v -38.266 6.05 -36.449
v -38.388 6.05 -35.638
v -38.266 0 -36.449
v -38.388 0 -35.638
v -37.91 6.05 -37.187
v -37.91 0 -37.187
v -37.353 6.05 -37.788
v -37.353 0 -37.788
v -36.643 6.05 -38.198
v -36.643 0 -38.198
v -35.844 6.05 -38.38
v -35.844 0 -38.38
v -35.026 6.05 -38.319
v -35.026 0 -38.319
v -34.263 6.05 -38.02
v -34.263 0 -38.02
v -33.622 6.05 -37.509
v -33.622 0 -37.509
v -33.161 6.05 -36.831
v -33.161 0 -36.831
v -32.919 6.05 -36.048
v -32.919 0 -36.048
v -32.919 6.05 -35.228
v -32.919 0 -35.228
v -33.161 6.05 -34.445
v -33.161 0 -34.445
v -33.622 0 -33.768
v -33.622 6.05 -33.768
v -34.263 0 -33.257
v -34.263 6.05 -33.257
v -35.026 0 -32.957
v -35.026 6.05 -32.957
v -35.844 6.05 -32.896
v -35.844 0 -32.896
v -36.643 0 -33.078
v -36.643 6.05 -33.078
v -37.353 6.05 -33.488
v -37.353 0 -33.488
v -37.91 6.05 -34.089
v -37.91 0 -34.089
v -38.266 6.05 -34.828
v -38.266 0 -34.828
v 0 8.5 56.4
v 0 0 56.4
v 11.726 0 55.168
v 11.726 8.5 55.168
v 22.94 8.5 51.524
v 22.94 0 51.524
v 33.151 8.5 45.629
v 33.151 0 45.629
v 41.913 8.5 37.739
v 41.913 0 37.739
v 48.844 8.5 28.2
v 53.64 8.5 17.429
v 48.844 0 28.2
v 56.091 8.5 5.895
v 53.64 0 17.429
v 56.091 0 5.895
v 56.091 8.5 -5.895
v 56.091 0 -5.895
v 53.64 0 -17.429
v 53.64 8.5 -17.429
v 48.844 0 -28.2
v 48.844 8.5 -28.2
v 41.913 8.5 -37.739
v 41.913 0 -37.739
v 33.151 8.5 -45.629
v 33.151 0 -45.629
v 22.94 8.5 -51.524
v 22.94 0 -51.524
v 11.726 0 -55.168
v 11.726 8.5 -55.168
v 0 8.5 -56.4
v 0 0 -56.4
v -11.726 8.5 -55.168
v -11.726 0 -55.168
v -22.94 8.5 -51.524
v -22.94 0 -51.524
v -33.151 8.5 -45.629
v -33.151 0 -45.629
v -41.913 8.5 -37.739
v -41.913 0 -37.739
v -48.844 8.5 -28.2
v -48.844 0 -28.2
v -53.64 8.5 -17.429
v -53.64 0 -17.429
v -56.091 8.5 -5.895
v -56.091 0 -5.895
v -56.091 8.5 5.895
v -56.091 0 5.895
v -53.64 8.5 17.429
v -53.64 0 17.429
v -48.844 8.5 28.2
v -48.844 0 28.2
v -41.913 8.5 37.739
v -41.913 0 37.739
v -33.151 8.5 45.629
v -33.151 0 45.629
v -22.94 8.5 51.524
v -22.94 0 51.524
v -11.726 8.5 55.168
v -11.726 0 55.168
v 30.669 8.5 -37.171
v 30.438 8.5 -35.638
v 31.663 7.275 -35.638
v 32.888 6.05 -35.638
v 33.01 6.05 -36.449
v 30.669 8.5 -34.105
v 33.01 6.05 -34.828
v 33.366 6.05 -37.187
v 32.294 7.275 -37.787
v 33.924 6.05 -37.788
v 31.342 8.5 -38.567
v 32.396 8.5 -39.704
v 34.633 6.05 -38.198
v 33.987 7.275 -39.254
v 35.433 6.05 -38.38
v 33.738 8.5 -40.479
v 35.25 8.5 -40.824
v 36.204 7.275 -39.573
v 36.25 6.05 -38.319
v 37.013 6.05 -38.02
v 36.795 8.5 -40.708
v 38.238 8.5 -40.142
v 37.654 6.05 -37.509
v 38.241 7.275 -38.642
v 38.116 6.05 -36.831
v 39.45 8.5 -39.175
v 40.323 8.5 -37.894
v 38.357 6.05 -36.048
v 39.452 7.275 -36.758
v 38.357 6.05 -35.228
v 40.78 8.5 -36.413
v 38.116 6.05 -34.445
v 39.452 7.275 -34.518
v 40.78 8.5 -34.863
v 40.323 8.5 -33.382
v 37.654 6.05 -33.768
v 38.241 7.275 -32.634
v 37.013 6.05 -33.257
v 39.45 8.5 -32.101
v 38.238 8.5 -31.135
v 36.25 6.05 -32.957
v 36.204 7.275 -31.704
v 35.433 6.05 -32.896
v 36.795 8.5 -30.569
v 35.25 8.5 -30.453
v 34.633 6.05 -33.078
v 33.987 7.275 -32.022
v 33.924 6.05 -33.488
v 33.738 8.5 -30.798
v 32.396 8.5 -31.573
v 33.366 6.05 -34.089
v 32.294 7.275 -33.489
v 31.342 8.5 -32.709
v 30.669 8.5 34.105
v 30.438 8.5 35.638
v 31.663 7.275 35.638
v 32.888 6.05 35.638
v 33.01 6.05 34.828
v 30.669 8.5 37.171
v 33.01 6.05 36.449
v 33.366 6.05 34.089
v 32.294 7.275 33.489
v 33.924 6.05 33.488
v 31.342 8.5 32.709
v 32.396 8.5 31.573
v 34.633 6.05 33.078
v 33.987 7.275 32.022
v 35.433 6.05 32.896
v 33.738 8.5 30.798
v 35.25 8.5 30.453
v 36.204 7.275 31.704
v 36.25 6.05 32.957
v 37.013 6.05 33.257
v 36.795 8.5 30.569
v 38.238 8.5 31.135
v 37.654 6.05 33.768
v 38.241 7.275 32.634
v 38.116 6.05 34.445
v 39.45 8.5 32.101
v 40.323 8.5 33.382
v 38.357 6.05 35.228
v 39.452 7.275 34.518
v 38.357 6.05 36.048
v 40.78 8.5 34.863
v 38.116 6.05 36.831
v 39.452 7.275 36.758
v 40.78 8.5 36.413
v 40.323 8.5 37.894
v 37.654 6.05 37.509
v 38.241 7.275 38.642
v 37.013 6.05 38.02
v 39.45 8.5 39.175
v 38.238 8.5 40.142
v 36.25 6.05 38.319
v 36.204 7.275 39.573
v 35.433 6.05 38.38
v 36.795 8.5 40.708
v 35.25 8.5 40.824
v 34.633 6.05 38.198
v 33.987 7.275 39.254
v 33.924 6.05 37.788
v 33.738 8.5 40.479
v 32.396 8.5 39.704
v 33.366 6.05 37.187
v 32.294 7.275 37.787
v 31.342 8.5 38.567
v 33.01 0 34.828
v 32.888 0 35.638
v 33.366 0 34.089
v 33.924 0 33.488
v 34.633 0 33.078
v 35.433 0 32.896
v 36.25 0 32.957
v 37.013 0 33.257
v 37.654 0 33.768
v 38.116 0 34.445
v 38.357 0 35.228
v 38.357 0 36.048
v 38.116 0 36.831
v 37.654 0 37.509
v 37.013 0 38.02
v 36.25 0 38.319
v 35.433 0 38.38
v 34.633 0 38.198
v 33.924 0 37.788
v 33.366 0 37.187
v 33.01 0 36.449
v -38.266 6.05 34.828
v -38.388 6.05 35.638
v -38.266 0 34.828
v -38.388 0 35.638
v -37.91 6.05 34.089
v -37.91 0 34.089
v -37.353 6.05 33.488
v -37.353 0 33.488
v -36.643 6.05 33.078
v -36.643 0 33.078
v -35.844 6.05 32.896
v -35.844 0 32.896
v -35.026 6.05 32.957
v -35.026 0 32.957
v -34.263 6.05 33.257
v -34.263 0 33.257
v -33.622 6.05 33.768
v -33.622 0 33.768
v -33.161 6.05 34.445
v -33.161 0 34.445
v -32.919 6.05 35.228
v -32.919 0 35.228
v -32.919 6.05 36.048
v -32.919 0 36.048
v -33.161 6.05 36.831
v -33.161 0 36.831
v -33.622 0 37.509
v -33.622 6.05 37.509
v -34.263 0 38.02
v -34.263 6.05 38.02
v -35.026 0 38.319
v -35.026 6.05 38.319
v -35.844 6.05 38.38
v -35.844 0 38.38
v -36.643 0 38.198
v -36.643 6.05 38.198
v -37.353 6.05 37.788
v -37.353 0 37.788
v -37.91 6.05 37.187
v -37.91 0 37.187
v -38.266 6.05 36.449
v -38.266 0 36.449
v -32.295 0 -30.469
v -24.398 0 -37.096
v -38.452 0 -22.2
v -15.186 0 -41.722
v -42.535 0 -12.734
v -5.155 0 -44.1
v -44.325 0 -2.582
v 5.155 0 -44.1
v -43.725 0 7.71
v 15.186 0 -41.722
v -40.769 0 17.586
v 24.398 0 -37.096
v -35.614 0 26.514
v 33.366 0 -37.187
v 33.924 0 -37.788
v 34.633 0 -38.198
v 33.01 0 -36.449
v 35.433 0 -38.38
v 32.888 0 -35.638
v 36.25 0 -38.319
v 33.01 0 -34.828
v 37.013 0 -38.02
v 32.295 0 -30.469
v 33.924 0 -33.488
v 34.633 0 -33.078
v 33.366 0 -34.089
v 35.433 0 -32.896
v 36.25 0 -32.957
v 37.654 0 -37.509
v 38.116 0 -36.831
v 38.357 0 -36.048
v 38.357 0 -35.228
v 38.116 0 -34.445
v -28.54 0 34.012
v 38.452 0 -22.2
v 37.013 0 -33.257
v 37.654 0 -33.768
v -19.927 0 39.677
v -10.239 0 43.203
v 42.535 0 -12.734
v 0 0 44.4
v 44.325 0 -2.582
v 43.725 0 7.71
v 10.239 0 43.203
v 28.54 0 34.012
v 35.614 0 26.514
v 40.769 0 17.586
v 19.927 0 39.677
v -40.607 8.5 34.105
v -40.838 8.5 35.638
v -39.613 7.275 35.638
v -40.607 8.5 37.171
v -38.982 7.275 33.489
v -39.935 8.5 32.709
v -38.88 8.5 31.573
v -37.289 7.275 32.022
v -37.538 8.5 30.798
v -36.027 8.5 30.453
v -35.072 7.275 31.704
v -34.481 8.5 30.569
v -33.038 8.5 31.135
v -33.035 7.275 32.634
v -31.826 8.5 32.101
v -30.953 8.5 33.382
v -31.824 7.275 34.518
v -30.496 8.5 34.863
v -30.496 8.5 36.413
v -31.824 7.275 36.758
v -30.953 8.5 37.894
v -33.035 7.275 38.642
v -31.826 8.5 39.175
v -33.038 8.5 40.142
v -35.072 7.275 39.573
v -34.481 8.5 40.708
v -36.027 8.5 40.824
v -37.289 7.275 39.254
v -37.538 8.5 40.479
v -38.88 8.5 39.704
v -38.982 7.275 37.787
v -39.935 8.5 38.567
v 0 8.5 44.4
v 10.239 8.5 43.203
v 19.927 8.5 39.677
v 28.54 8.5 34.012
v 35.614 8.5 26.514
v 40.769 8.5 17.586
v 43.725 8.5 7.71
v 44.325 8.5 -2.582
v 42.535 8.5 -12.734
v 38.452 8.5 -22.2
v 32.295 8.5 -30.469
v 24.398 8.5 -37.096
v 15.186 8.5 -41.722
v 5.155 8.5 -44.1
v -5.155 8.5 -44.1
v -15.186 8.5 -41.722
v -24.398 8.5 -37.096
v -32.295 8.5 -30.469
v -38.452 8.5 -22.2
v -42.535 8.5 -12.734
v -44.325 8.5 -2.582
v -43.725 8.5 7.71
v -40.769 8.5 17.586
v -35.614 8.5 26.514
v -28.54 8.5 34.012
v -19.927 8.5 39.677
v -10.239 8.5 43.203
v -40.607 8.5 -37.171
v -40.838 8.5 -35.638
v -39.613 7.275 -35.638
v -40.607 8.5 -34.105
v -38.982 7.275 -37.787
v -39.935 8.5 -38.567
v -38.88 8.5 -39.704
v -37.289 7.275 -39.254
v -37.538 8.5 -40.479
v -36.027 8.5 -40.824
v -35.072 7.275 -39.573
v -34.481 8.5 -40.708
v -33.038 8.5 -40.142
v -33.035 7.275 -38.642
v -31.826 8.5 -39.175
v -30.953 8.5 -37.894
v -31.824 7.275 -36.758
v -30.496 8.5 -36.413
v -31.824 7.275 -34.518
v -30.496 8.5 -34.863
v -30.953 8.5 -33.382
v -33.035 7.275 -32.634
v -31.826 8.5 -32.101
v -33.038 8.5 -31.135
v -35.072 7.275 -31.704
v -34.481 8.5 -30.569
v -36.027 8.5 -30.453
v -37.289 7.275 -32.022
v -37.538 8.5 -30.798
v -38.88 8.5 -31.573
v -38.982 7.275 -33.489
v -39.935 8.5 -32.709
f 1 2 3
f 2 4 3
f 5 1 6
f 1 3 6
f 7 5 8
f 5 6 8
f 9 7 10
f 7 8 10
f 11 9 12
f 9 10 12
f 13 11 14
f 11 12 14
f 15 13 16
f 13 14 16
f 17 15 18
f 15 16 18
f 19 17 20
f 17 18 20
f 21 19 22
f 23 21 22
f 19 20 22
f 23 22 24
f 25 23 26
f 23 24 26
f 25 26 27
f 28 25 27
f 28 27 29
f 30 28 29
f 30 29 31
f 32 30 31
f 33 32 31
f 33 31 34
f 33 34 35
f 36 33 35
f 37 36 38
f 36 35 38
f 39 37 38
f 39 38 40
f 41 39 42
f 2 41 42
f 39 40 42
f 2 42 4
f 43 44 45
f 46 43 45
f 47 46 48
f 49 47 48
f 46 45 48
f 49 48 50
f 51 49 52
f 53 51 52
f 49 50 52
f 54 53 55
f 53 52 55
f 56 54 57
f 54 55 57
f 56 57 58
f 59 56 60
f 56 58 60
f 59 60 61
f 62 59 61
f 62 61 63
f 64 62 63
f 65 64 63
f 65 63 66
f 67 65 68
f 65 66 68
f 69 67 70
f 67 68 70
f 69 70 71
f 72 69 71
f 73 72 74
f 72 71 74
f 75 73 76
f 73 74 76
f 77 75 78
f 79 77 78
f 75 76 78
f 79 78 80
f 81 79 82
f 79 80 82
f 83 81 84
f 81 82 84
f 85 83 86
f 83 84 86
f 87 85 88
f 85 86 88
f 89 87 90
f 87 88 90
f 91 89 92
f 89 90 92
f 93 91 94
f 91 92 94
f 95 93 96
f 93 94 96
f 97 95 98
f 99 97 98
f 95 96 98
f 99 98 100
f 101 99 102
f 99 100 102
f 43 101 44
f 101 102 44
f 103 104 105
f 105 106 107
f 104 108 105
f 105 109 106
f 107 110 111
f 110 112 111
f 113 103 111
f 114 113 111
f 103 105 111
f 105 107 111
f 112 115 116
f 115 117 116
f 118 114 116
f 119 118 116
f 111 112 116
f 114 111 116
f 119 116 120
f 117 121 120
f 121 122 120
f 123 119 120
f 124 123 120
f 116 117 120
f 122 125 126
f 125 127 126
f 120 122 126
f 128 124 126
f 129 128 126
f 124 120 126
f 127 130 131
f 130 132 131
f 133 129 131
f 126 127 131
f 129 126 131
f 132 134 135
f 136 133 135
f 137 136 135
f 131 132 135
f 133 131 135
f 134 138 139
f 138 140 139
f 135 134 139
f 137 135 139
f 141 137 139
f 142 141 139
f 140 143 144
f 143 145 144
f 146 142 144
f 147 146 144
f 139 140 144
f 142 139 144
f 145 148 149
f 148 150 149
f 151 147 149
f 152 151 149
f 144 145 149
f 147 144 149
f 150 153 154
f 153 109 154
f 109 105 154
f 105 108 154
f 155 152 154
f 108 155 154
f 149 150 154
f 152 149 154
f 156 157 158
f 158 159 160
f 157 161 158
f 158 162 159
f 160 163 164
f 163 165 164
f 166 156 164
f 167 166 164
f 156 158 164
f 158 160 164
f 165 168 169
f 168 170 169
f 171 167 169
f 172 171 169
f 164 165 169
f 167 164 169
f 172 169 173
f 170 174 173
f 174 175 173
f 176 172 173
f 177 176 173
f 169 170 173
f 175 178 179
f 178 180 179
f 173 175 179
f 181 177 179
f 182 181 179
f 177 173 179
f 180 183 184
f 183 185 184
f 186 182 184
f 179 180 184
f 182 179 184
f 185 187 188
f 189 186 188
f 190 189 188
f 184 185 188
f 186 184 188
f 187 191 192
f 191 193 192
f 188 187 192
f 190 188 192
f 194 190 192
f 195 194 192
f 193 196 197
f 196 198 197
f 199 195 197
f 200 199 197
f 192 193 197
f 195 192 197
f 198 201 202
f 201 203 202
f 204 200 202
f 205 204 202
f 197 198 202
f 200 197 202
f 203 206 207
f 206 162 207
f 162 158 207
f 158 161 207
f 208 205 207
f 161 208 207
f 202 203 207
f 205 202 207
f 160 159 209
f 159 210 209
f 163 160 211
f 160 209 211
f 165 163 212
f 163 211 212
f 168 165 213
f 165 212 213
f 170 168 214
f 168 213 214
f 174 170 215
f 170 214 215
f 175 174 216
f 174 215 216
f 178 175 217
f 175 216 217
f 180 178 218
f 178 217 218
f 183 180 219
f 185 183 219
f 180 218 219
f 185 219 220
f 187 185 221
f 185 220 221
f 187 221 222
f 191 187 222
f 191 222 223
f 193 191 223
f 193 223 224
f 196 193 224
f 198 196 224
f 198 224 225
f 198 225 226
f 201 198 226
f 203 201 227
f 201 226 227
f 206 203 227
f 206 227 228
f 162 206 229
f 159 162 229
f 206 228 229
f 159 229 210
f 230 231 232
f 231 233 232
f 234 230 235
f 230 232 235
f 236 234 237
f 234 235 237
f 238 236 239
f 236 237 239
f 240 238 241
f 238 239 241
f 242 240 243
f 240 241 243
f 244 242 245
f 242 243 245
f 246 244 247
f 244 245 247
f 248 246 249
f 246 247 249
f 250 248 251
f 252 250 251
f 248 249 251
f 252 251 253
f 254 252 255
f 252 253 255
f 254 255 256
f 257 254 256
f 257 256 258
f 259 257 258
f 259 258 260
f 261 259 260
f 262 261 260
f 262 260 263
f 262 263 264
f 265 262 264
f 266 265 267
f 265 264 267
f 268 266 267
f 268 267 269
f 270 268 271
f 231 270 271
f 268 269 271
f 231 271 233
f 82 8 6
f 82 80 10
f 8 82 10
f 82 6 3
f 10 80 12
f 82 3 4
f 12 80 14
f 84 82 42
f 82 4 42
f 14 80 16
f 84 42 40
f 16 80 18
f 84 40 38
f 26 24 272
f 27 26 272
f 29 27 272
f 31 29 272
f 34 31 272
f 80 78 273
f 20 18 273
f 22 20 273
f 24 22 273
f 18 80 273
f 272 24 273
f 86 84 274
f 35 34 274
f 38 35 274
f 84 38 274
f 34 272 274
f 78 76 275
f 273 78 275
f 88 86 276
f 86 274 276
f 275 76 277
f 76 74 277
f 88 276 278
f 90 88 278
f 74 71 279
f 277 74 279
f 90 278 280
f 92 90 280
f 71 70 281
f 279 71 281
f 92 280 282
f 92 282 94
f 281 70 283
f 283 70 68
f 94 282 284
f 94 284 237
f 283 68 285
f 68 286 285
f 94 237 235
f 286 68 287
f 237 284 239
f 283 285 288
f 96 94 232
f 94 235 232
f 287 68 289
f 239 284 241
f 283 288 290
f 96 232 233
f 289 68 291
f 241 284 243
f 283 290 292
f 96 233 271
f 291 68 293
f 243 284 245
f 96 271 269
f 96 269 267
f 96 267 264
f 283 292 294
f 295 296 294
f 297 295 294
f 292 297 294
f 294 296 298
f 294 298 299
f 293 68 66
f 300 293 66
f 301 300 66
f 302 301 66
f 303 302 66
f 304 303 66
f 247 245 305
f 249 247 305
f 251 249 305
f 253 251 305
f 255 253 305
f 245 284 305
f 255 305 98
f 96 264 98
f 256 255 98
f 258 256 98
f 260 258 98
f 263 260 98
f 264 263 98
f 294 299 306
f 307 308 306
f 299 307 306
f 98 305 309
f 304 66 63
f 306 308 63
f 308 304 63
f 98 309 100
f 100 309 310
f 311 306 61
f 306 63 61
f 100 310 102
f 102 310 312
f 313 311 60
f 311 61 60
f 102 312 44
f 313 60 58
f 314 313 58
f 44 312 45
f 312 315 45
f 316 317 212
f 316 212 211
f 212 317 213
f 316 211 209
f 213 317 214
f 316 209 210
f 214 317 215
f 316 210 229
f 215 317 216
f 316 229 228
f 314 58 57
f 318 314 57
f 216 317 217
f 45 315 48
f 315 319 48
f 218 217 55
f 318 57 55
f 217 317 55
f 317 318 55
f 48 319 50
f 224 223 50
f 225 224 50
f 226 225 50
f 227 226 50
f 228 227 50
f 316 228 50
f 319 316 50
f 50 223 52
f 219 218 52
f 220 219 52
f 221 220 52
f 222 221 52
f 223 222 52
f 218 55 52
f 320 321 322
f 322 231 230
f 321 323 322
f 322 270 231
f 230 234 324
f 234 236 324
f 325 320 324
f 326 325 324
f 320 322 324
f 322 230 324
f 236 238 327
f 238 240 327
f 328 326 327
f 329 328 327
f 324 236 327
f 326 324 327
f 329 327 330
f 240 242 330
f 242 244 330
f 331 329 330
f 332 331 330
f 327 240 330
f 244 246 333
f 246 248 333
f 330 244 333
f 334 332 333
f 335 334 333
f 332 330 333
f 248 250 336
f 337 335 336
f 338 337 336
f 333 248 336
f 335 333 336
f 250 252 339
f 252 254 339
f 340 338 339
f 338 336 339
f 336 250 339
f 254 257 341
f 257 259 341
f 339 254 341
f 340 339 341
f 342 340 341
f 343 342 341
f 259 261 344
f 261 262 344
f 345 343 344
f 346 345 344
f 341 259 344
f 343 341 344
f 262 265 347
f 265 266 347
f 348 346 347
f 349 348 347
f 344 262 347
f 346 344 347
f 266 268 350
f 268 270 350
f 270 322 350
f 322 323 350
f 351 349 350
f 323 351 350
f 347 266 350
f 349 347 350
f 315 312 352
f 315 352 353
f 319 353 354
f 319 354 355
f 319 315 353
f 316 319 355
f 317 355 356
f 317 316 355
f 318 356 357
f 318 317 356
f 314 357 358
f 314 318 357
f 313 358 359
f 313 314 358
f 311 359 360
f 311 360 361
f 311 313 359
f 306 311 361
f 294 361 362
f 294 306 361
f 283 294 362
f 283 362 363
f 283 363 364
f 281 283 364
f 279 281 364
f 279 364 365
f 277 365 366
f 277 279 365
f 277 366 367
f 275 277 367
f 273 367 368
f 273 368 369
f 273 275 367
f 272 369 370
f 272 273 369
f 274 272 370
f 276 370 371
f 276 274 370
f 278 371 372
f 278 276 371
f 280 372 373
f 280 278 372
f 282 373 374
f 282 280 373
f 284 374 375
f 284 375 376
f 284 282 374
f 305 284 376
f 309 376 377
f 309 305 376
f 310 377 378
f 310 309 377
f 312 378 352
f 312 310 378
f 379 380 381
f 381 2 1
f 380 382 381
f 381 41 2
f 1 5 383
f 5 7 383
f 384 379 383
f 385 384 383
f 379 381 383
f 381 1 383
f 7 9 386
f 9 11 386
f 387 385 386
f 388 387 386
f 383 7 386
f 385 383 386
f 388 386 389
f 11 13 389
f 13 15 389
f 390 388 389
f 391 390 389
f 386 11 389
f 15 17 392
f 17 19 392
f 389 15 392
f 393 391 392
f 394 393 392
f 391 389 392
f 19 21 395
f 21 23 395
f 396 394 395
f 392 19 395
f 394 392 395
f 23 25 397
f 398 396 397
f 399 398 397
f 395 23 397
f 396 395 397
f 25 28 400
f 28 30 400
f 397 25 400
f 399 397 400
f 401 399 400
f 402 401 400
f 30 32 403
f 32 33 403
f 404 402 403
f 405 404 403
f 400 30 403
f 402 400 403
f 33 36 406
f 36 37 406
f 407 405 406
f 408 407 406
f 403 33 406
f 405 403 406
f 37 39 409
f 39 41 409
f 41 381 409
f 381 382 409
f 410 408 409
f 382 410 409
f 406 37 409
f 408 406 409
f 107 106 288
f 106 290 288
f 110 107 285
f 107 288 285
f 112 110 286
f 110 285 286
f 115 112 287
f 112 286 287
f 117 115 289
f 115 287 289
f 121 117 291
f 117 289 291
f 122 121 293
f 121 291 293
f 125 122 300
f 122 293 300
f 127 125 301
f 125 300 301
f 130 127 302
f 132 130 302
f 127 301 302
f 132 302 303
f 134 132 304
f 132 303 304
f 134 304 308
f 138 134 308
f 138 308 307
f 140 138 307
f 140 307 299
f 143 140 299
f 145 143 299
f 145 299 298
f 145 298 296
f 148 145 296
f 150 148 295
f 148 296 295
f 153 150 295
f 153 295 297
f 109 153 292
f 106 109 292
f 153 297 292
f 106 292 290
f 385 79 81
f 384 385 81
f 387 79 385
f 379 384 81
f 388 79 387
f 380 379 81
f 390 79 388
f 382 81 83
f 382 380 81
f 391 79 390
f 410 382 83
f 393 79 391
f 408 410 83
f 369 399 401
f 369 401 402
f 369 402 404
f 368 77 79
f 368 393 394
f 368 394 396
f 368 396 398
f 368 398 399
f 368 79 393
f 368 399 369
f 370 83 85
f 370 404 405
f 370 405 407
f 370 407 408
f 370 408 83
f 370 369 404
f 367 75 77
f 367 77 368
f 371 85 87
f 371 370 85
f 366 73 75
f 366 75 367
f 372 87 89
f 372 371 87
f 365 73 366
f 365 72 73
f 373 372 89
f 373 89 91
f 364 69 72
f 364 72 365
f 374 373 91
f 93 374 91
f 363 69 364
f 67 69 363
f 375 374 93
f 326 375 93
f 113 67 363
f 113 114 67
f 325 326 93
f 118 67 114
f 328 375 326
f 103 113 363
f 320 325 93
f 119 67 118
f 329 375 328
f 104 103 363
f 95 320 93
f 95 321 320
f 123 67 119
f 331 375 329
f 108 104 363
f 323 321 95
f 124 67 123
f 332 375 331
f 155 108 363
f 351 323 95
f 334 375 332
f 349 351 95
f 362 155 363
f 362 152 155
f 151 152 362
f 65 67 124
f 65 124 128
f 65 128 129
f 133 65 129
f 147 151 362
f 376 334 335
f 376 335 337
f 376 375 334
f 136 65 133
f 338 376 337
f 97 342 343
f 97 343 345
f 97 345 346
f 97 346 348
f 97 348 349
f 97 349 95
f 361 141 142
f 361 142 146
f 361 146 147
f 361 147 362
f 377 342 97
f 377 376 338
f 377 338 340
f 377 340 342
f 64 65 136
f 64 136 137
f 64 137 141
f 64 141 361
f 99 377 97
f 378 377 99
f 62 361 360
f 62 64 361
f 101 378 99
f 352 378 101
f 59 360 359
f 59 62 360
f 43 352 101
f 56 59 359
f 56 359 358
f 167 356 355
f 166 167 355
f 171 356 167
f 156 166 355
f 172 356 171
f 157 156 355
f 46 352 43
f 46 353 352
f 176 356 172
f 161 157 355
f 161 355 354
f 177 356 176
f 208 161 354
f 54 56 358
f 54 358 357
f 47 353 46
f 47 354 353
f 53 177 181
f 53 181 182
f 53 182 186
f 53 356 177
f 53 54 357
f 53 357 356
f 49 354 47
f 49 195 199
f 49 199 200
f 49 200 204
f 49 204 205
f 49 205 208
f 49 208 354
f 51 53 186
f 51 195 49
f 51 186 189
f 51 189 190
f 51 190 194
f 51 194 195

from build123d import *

# Parameters (mm, degrees)
SKETCH1_R                                       = 56.4
SKETCH1_R_2                                     = 44.4
BOSS_EXTRUDE1_DEPTH                             = 8.5
CSK_FOR_M5_FLAT_HEAD_MACHINE_SCREW1_D           = 5.5
CSK_FOR_M5_FLAT_HEAD_MACHINE_SCREW1_DEPTH       = 30
CSK_FOR_M5_FLAT_HEAD_MACHINE_SCREW1_CSINK_D     = 10.4
CSK_FOR_M5_FLAT_HEAD_MACHINE_SCREW1_CSINK_ANGLE = 90
CSK_FOR_M5_FLAT_HEAD_MACHINE_SCREW1_TIP         = 1.652366702


with BuildPart() as part:
    # Sketch1 → Boss-Extrude1 (new body)
    with BuildSketch(Plane(origin=(0, 0, 0), x_dir=(1, 0, 0), z_dir=(0, 1, 0))):
        with Locations(Location((0, 0, 0), (0, 0, 270))):
            Circle(SKETCH1_R)
        with Locations(Location((0, 0, 0), (0, 0, 270))):
            Circle(SKETCH1_R_2, mode=Mode.SUBTRACT)
    extrude(amount=BOSS_EXTRUDE1_DEPTH)

    # CSK for M5 Flat Head Machine Screw1
    with Locations(Plane(origin=(0, 8.5, 0), x_dir=(1, 0, 0), z_dir=(0, 1, 0))):
        with Locations((35.638181772, 35.638181772), (35.638181772, -35.638181772), (-35.638181772, -35.638181772), (-35.638181772, 35.638181772)):
            CounterSinkHole(CSK_FOR_M5_FLAT_HEAD_MACHINE_SCREW1_D / 2, CSK_FOR_M5_FLAT_HEAD_MACHINE_SCREW1_CSINK_D / 2, depth=CSK_FOR_M5_FLAT_HEAD_MACHINE_SCREW1_DEPTH, counter_sink_angle=CSK_FOR_M5_FLAT_HEAD_MACHINE_SCREW1_CSINK_ANGLE)
            with Locations((0, 0, -(CSK_FOR_M5_FLAT_HEAD_MACHINE_SCREW1_DEPTH + CSK_FOR_M5_FLAT_HEAD_MACHINE_SCREW1_TIP / 2))):  # 118° drill point
                Cone(0, CSK_FOR_M5_FLAT_HEAD_MACHINE_SCREW1_D / 2, CSK_FOR_M5_FLAT_HEAD_MACHINE_SCREW1_TIP, mode=Mode.SUBTRACT)


solid = part.part
